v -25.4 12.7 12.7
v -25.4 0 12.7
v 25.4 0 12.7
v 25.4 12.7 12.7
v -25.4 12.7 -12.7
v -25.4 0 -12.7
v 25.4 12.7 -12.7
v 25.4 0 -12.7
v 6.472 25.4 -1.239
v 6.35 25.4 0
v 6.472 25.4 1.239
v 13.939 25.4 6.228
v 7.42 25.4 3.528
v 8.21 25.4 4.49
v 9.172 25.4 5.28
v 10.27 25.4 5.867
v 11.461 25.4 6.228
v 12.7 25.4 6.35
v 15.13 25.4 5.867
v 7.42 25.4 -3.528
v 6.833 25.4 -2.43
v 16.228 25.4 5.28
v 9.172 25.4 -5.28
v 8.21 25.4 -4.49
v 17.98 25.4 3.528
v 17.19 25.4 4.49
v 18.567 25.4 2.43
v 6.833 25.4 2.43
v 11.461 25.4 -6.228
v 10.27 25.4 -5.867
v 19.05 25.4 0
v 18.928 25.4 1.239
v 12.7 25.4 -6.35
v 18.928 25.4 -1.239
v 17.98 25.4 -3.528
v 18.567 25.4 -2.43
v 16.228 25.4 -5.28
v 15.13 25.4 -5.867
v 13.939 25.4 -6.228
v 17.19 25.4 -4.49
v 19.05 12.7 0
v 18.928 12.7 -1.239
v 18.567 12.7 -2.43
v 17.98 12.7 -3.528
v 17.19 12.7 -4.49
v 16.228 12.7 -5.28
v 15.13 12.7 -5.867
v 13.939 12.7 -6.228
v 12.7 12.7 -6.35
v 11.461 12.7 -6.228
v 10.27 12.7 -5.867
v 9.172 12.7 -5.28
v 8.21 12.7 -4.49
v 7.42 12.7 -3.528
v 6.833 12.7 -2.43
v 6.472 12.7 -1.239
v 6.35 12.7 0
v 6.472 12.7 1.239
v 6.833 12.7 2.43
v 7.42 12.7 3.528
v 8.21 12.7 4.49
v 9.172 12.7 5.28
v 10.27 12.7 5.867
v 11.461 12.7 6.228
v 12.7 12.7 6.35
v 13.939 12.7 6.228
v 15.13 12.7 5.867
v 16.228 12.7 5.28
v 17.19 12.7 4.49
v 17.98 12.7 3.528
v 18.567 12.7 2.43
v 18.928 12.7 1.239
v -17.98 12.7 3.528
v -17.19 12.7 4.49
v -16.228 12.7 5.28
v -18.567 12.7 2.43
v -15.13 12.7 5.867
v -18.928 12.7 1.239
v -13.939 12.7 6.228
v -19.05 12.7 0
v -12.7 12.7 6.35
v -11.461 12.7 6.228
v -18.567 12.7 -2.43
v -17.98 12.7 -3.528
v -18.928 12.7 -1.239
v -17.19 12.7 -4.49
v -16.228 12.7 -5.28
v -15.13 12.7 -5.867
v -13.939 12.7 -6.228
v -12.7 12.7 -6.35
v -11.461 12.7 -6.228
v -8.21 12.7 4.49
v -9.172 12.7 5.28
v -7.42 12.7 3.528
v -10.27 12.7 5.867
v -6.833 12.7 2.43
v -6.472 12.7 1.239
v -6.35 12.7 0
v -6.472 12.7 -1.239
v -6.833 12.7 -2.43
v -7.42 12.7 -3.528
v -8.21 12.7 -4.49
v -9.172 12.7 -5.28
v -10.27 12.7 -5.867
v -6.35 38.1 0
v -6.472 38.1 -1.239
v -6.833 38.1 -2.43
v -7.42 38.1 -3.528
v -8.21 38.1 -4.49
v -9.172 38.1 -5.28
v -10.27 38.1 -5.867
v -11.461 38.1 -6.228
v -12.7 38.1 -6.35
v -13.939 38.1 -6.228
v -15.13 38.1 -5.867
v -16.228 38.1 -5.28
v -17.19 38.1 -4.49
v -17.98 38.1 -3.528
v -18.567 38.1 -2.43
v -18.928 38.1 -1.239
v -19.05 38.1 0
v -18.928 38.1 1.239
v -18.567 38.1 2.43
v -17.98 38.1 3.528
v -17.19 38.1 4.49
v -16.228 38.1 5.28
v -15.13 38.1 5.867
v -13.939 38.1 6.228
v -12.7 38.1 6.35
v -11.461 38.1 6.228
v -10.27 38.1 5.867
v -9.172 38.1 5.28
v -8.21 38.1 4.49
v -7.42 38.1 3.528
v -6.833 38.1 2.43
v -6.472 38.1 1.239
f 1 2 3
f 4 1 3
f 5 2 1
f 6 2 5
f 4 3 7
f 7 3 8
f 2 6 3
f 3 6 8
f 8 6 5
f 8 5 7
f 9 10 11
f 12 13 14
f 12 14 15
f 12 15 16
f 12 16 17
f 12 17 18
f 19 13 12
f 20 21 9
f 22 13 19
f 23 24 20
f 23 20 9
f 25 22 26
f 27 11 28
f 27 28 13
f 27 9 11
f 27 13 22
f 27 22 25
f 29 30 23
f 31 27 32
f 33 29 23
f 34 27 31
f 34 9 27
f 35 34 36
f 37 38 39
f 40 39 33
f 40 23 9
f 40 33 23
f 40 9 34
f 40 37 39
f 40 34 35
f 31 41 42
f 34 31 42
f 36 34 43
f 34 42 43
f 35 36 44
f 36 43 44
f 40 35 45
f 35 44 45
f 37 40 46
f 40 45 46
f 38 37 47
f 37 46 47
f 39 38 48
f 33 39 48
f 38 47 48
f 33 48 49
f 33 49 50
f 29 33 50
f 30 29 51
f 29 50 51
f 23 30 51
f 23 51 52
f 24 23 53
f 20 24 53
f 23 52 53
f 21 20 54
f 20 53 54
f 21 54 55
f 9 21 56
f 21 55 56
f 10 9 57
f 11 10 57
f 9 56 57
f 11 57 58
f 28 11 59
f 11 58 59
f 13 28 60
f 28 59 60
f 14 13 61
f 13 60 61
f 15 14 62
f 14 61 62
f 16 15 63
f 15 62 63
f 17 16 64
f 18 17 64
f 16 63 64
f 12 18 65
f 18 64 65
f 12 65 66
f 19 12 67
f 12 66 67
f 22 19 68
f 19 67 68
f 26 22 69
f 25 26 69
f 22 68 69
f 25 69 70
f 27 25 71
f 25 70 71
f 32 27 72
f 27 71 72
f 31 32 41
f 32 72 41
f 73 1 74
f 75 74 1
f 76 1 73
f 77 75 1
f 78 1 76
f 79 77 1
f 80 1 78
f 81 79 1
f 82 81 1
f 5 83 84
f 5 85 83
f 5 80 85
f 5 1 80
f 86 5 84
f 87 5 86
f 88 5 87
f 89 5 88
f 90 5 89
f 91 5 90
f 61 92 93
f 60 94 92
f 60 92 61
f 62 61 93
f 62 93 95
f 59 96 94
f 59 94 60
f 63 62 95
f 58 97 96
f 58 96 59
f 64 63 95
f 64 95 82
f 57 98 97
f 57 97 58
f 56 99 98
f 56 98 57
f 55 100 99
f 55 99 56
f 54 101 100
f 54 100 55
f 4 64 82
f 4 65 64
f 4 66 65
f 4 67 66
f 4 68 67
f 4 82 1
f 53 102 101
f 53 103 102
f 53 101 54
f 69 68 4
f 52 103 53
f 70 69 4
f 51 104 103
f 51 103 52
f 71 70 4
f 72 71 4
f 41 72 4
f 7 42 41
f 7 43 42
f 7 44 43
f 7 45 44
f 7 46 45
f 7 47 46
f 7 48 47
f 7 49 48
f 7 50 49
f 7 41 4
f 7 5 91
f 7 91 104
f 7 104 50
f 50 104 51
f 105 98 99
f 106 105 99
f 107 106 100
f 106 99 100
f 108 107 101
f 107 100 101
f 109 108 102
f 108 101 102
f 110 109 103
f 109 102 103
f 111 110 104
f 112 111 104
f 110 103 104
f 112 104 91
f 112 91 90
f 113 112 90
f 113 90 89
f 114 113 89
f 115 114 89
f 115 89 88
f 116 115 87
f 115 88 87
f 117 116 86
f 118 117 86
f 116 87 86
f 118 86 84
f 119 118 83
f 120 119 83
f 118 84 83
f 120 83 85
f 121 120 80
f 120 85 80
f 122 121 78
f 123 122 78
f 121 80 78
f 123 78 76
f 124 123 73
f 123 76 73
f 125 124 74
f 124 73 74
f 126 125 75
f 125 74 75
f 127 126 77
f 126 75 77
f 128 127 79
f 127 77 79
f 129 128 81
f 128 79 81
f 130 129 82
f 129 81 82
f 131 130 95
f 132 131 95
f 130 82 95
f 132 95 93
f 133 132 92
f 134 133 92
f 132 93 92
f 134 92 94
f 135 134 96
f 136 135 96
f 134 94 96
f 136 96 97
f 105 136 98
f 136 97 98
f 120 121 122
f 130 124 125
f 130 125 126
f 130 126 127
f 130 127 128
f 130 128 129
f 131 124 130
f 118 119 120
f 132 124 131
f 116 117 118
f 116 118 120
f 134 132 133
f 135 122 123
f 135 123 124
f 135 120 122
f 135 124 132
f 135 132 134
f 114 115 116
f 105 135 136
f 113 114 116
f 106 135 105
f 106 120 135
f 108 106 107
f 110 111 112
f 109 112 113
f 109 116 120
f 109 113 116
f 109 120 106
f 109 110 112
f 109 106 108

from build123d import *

# Parameters (mm, degrees)
SKETCH1_W           = 50.8
SKETCH1_H           = 25.4
BOSS_EXTRUDE1_DEPTH = 12.7
SKETCH2_R           = 6.35
BOSS_EXTRUDE2_DEPTH = 25.4
SKETCH3_R           = 6.35
BOSS_EXTRUDE3_DEPTH = 12.7


with BuildPart() as part:
    # Sketch1 → Boss-Extrude1 (new body)
    with BuildSketch(Plane(origin=(0, 0, 0), x_dir=(1, 0, 0), z_dir=(0, 1, 0))):
        Rectangle(SKETCH1_W, SKETCH1_H)
    extrude(amount=BOSS_EXTRUDE1_DEPTH)

    # Sketch2 → Boss-Extrude2 (add)
    with BuildSketch(Plane(origin=(0, 12.7, 0), x_dir=(1, 0, 0), z_dir=(0, 1, 0))):
        with Locations((-12.7, 0)):
            Circle(SKETCH2_R)
    extrude(amount=BOSS_EXTRUDE2_DEPTH)

    # Sketch3 → Boss-Extrude3 (add)
    with BuildSketch(Plane(origin=(0, 12.7, 0), x_dir=(1, 0, 0), z_dir=(0, 1, 0))):
        with Locations((12.7, 0)):
            Circle(SKETCH3_R)
    extrude(amount=BOSS_EXTRUDE3_DEPTH)


solid = part.part
